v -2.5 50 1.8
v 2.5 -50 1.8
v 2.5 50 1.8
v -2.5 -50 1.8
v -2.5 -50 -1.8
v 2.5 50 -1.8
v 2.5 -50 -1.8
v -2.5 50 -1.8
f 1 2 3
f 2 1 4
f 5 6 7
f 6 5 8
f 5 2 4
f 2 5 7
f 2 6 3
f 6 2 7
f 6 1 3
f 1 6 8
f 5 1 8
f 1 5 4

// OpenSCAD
// Parameters
rail_length = 100.0; //[50.0:200.0:1]
rail_width = 5.0; //[2.5:10.0:0.1]
rail_height = 3.6; //[1.8:7.2:0.1]

// Rail Body
module rail_body() {
  color("Silver") // Aluminum-like appearance
  translate([0, 0, 0]) // Centered at origin
    cube([rail_width, rail_length, rail_height], center=true);
}

// Final Model
module rail_model() {
  rail_body();
}

// Render the final output
rail_model();
